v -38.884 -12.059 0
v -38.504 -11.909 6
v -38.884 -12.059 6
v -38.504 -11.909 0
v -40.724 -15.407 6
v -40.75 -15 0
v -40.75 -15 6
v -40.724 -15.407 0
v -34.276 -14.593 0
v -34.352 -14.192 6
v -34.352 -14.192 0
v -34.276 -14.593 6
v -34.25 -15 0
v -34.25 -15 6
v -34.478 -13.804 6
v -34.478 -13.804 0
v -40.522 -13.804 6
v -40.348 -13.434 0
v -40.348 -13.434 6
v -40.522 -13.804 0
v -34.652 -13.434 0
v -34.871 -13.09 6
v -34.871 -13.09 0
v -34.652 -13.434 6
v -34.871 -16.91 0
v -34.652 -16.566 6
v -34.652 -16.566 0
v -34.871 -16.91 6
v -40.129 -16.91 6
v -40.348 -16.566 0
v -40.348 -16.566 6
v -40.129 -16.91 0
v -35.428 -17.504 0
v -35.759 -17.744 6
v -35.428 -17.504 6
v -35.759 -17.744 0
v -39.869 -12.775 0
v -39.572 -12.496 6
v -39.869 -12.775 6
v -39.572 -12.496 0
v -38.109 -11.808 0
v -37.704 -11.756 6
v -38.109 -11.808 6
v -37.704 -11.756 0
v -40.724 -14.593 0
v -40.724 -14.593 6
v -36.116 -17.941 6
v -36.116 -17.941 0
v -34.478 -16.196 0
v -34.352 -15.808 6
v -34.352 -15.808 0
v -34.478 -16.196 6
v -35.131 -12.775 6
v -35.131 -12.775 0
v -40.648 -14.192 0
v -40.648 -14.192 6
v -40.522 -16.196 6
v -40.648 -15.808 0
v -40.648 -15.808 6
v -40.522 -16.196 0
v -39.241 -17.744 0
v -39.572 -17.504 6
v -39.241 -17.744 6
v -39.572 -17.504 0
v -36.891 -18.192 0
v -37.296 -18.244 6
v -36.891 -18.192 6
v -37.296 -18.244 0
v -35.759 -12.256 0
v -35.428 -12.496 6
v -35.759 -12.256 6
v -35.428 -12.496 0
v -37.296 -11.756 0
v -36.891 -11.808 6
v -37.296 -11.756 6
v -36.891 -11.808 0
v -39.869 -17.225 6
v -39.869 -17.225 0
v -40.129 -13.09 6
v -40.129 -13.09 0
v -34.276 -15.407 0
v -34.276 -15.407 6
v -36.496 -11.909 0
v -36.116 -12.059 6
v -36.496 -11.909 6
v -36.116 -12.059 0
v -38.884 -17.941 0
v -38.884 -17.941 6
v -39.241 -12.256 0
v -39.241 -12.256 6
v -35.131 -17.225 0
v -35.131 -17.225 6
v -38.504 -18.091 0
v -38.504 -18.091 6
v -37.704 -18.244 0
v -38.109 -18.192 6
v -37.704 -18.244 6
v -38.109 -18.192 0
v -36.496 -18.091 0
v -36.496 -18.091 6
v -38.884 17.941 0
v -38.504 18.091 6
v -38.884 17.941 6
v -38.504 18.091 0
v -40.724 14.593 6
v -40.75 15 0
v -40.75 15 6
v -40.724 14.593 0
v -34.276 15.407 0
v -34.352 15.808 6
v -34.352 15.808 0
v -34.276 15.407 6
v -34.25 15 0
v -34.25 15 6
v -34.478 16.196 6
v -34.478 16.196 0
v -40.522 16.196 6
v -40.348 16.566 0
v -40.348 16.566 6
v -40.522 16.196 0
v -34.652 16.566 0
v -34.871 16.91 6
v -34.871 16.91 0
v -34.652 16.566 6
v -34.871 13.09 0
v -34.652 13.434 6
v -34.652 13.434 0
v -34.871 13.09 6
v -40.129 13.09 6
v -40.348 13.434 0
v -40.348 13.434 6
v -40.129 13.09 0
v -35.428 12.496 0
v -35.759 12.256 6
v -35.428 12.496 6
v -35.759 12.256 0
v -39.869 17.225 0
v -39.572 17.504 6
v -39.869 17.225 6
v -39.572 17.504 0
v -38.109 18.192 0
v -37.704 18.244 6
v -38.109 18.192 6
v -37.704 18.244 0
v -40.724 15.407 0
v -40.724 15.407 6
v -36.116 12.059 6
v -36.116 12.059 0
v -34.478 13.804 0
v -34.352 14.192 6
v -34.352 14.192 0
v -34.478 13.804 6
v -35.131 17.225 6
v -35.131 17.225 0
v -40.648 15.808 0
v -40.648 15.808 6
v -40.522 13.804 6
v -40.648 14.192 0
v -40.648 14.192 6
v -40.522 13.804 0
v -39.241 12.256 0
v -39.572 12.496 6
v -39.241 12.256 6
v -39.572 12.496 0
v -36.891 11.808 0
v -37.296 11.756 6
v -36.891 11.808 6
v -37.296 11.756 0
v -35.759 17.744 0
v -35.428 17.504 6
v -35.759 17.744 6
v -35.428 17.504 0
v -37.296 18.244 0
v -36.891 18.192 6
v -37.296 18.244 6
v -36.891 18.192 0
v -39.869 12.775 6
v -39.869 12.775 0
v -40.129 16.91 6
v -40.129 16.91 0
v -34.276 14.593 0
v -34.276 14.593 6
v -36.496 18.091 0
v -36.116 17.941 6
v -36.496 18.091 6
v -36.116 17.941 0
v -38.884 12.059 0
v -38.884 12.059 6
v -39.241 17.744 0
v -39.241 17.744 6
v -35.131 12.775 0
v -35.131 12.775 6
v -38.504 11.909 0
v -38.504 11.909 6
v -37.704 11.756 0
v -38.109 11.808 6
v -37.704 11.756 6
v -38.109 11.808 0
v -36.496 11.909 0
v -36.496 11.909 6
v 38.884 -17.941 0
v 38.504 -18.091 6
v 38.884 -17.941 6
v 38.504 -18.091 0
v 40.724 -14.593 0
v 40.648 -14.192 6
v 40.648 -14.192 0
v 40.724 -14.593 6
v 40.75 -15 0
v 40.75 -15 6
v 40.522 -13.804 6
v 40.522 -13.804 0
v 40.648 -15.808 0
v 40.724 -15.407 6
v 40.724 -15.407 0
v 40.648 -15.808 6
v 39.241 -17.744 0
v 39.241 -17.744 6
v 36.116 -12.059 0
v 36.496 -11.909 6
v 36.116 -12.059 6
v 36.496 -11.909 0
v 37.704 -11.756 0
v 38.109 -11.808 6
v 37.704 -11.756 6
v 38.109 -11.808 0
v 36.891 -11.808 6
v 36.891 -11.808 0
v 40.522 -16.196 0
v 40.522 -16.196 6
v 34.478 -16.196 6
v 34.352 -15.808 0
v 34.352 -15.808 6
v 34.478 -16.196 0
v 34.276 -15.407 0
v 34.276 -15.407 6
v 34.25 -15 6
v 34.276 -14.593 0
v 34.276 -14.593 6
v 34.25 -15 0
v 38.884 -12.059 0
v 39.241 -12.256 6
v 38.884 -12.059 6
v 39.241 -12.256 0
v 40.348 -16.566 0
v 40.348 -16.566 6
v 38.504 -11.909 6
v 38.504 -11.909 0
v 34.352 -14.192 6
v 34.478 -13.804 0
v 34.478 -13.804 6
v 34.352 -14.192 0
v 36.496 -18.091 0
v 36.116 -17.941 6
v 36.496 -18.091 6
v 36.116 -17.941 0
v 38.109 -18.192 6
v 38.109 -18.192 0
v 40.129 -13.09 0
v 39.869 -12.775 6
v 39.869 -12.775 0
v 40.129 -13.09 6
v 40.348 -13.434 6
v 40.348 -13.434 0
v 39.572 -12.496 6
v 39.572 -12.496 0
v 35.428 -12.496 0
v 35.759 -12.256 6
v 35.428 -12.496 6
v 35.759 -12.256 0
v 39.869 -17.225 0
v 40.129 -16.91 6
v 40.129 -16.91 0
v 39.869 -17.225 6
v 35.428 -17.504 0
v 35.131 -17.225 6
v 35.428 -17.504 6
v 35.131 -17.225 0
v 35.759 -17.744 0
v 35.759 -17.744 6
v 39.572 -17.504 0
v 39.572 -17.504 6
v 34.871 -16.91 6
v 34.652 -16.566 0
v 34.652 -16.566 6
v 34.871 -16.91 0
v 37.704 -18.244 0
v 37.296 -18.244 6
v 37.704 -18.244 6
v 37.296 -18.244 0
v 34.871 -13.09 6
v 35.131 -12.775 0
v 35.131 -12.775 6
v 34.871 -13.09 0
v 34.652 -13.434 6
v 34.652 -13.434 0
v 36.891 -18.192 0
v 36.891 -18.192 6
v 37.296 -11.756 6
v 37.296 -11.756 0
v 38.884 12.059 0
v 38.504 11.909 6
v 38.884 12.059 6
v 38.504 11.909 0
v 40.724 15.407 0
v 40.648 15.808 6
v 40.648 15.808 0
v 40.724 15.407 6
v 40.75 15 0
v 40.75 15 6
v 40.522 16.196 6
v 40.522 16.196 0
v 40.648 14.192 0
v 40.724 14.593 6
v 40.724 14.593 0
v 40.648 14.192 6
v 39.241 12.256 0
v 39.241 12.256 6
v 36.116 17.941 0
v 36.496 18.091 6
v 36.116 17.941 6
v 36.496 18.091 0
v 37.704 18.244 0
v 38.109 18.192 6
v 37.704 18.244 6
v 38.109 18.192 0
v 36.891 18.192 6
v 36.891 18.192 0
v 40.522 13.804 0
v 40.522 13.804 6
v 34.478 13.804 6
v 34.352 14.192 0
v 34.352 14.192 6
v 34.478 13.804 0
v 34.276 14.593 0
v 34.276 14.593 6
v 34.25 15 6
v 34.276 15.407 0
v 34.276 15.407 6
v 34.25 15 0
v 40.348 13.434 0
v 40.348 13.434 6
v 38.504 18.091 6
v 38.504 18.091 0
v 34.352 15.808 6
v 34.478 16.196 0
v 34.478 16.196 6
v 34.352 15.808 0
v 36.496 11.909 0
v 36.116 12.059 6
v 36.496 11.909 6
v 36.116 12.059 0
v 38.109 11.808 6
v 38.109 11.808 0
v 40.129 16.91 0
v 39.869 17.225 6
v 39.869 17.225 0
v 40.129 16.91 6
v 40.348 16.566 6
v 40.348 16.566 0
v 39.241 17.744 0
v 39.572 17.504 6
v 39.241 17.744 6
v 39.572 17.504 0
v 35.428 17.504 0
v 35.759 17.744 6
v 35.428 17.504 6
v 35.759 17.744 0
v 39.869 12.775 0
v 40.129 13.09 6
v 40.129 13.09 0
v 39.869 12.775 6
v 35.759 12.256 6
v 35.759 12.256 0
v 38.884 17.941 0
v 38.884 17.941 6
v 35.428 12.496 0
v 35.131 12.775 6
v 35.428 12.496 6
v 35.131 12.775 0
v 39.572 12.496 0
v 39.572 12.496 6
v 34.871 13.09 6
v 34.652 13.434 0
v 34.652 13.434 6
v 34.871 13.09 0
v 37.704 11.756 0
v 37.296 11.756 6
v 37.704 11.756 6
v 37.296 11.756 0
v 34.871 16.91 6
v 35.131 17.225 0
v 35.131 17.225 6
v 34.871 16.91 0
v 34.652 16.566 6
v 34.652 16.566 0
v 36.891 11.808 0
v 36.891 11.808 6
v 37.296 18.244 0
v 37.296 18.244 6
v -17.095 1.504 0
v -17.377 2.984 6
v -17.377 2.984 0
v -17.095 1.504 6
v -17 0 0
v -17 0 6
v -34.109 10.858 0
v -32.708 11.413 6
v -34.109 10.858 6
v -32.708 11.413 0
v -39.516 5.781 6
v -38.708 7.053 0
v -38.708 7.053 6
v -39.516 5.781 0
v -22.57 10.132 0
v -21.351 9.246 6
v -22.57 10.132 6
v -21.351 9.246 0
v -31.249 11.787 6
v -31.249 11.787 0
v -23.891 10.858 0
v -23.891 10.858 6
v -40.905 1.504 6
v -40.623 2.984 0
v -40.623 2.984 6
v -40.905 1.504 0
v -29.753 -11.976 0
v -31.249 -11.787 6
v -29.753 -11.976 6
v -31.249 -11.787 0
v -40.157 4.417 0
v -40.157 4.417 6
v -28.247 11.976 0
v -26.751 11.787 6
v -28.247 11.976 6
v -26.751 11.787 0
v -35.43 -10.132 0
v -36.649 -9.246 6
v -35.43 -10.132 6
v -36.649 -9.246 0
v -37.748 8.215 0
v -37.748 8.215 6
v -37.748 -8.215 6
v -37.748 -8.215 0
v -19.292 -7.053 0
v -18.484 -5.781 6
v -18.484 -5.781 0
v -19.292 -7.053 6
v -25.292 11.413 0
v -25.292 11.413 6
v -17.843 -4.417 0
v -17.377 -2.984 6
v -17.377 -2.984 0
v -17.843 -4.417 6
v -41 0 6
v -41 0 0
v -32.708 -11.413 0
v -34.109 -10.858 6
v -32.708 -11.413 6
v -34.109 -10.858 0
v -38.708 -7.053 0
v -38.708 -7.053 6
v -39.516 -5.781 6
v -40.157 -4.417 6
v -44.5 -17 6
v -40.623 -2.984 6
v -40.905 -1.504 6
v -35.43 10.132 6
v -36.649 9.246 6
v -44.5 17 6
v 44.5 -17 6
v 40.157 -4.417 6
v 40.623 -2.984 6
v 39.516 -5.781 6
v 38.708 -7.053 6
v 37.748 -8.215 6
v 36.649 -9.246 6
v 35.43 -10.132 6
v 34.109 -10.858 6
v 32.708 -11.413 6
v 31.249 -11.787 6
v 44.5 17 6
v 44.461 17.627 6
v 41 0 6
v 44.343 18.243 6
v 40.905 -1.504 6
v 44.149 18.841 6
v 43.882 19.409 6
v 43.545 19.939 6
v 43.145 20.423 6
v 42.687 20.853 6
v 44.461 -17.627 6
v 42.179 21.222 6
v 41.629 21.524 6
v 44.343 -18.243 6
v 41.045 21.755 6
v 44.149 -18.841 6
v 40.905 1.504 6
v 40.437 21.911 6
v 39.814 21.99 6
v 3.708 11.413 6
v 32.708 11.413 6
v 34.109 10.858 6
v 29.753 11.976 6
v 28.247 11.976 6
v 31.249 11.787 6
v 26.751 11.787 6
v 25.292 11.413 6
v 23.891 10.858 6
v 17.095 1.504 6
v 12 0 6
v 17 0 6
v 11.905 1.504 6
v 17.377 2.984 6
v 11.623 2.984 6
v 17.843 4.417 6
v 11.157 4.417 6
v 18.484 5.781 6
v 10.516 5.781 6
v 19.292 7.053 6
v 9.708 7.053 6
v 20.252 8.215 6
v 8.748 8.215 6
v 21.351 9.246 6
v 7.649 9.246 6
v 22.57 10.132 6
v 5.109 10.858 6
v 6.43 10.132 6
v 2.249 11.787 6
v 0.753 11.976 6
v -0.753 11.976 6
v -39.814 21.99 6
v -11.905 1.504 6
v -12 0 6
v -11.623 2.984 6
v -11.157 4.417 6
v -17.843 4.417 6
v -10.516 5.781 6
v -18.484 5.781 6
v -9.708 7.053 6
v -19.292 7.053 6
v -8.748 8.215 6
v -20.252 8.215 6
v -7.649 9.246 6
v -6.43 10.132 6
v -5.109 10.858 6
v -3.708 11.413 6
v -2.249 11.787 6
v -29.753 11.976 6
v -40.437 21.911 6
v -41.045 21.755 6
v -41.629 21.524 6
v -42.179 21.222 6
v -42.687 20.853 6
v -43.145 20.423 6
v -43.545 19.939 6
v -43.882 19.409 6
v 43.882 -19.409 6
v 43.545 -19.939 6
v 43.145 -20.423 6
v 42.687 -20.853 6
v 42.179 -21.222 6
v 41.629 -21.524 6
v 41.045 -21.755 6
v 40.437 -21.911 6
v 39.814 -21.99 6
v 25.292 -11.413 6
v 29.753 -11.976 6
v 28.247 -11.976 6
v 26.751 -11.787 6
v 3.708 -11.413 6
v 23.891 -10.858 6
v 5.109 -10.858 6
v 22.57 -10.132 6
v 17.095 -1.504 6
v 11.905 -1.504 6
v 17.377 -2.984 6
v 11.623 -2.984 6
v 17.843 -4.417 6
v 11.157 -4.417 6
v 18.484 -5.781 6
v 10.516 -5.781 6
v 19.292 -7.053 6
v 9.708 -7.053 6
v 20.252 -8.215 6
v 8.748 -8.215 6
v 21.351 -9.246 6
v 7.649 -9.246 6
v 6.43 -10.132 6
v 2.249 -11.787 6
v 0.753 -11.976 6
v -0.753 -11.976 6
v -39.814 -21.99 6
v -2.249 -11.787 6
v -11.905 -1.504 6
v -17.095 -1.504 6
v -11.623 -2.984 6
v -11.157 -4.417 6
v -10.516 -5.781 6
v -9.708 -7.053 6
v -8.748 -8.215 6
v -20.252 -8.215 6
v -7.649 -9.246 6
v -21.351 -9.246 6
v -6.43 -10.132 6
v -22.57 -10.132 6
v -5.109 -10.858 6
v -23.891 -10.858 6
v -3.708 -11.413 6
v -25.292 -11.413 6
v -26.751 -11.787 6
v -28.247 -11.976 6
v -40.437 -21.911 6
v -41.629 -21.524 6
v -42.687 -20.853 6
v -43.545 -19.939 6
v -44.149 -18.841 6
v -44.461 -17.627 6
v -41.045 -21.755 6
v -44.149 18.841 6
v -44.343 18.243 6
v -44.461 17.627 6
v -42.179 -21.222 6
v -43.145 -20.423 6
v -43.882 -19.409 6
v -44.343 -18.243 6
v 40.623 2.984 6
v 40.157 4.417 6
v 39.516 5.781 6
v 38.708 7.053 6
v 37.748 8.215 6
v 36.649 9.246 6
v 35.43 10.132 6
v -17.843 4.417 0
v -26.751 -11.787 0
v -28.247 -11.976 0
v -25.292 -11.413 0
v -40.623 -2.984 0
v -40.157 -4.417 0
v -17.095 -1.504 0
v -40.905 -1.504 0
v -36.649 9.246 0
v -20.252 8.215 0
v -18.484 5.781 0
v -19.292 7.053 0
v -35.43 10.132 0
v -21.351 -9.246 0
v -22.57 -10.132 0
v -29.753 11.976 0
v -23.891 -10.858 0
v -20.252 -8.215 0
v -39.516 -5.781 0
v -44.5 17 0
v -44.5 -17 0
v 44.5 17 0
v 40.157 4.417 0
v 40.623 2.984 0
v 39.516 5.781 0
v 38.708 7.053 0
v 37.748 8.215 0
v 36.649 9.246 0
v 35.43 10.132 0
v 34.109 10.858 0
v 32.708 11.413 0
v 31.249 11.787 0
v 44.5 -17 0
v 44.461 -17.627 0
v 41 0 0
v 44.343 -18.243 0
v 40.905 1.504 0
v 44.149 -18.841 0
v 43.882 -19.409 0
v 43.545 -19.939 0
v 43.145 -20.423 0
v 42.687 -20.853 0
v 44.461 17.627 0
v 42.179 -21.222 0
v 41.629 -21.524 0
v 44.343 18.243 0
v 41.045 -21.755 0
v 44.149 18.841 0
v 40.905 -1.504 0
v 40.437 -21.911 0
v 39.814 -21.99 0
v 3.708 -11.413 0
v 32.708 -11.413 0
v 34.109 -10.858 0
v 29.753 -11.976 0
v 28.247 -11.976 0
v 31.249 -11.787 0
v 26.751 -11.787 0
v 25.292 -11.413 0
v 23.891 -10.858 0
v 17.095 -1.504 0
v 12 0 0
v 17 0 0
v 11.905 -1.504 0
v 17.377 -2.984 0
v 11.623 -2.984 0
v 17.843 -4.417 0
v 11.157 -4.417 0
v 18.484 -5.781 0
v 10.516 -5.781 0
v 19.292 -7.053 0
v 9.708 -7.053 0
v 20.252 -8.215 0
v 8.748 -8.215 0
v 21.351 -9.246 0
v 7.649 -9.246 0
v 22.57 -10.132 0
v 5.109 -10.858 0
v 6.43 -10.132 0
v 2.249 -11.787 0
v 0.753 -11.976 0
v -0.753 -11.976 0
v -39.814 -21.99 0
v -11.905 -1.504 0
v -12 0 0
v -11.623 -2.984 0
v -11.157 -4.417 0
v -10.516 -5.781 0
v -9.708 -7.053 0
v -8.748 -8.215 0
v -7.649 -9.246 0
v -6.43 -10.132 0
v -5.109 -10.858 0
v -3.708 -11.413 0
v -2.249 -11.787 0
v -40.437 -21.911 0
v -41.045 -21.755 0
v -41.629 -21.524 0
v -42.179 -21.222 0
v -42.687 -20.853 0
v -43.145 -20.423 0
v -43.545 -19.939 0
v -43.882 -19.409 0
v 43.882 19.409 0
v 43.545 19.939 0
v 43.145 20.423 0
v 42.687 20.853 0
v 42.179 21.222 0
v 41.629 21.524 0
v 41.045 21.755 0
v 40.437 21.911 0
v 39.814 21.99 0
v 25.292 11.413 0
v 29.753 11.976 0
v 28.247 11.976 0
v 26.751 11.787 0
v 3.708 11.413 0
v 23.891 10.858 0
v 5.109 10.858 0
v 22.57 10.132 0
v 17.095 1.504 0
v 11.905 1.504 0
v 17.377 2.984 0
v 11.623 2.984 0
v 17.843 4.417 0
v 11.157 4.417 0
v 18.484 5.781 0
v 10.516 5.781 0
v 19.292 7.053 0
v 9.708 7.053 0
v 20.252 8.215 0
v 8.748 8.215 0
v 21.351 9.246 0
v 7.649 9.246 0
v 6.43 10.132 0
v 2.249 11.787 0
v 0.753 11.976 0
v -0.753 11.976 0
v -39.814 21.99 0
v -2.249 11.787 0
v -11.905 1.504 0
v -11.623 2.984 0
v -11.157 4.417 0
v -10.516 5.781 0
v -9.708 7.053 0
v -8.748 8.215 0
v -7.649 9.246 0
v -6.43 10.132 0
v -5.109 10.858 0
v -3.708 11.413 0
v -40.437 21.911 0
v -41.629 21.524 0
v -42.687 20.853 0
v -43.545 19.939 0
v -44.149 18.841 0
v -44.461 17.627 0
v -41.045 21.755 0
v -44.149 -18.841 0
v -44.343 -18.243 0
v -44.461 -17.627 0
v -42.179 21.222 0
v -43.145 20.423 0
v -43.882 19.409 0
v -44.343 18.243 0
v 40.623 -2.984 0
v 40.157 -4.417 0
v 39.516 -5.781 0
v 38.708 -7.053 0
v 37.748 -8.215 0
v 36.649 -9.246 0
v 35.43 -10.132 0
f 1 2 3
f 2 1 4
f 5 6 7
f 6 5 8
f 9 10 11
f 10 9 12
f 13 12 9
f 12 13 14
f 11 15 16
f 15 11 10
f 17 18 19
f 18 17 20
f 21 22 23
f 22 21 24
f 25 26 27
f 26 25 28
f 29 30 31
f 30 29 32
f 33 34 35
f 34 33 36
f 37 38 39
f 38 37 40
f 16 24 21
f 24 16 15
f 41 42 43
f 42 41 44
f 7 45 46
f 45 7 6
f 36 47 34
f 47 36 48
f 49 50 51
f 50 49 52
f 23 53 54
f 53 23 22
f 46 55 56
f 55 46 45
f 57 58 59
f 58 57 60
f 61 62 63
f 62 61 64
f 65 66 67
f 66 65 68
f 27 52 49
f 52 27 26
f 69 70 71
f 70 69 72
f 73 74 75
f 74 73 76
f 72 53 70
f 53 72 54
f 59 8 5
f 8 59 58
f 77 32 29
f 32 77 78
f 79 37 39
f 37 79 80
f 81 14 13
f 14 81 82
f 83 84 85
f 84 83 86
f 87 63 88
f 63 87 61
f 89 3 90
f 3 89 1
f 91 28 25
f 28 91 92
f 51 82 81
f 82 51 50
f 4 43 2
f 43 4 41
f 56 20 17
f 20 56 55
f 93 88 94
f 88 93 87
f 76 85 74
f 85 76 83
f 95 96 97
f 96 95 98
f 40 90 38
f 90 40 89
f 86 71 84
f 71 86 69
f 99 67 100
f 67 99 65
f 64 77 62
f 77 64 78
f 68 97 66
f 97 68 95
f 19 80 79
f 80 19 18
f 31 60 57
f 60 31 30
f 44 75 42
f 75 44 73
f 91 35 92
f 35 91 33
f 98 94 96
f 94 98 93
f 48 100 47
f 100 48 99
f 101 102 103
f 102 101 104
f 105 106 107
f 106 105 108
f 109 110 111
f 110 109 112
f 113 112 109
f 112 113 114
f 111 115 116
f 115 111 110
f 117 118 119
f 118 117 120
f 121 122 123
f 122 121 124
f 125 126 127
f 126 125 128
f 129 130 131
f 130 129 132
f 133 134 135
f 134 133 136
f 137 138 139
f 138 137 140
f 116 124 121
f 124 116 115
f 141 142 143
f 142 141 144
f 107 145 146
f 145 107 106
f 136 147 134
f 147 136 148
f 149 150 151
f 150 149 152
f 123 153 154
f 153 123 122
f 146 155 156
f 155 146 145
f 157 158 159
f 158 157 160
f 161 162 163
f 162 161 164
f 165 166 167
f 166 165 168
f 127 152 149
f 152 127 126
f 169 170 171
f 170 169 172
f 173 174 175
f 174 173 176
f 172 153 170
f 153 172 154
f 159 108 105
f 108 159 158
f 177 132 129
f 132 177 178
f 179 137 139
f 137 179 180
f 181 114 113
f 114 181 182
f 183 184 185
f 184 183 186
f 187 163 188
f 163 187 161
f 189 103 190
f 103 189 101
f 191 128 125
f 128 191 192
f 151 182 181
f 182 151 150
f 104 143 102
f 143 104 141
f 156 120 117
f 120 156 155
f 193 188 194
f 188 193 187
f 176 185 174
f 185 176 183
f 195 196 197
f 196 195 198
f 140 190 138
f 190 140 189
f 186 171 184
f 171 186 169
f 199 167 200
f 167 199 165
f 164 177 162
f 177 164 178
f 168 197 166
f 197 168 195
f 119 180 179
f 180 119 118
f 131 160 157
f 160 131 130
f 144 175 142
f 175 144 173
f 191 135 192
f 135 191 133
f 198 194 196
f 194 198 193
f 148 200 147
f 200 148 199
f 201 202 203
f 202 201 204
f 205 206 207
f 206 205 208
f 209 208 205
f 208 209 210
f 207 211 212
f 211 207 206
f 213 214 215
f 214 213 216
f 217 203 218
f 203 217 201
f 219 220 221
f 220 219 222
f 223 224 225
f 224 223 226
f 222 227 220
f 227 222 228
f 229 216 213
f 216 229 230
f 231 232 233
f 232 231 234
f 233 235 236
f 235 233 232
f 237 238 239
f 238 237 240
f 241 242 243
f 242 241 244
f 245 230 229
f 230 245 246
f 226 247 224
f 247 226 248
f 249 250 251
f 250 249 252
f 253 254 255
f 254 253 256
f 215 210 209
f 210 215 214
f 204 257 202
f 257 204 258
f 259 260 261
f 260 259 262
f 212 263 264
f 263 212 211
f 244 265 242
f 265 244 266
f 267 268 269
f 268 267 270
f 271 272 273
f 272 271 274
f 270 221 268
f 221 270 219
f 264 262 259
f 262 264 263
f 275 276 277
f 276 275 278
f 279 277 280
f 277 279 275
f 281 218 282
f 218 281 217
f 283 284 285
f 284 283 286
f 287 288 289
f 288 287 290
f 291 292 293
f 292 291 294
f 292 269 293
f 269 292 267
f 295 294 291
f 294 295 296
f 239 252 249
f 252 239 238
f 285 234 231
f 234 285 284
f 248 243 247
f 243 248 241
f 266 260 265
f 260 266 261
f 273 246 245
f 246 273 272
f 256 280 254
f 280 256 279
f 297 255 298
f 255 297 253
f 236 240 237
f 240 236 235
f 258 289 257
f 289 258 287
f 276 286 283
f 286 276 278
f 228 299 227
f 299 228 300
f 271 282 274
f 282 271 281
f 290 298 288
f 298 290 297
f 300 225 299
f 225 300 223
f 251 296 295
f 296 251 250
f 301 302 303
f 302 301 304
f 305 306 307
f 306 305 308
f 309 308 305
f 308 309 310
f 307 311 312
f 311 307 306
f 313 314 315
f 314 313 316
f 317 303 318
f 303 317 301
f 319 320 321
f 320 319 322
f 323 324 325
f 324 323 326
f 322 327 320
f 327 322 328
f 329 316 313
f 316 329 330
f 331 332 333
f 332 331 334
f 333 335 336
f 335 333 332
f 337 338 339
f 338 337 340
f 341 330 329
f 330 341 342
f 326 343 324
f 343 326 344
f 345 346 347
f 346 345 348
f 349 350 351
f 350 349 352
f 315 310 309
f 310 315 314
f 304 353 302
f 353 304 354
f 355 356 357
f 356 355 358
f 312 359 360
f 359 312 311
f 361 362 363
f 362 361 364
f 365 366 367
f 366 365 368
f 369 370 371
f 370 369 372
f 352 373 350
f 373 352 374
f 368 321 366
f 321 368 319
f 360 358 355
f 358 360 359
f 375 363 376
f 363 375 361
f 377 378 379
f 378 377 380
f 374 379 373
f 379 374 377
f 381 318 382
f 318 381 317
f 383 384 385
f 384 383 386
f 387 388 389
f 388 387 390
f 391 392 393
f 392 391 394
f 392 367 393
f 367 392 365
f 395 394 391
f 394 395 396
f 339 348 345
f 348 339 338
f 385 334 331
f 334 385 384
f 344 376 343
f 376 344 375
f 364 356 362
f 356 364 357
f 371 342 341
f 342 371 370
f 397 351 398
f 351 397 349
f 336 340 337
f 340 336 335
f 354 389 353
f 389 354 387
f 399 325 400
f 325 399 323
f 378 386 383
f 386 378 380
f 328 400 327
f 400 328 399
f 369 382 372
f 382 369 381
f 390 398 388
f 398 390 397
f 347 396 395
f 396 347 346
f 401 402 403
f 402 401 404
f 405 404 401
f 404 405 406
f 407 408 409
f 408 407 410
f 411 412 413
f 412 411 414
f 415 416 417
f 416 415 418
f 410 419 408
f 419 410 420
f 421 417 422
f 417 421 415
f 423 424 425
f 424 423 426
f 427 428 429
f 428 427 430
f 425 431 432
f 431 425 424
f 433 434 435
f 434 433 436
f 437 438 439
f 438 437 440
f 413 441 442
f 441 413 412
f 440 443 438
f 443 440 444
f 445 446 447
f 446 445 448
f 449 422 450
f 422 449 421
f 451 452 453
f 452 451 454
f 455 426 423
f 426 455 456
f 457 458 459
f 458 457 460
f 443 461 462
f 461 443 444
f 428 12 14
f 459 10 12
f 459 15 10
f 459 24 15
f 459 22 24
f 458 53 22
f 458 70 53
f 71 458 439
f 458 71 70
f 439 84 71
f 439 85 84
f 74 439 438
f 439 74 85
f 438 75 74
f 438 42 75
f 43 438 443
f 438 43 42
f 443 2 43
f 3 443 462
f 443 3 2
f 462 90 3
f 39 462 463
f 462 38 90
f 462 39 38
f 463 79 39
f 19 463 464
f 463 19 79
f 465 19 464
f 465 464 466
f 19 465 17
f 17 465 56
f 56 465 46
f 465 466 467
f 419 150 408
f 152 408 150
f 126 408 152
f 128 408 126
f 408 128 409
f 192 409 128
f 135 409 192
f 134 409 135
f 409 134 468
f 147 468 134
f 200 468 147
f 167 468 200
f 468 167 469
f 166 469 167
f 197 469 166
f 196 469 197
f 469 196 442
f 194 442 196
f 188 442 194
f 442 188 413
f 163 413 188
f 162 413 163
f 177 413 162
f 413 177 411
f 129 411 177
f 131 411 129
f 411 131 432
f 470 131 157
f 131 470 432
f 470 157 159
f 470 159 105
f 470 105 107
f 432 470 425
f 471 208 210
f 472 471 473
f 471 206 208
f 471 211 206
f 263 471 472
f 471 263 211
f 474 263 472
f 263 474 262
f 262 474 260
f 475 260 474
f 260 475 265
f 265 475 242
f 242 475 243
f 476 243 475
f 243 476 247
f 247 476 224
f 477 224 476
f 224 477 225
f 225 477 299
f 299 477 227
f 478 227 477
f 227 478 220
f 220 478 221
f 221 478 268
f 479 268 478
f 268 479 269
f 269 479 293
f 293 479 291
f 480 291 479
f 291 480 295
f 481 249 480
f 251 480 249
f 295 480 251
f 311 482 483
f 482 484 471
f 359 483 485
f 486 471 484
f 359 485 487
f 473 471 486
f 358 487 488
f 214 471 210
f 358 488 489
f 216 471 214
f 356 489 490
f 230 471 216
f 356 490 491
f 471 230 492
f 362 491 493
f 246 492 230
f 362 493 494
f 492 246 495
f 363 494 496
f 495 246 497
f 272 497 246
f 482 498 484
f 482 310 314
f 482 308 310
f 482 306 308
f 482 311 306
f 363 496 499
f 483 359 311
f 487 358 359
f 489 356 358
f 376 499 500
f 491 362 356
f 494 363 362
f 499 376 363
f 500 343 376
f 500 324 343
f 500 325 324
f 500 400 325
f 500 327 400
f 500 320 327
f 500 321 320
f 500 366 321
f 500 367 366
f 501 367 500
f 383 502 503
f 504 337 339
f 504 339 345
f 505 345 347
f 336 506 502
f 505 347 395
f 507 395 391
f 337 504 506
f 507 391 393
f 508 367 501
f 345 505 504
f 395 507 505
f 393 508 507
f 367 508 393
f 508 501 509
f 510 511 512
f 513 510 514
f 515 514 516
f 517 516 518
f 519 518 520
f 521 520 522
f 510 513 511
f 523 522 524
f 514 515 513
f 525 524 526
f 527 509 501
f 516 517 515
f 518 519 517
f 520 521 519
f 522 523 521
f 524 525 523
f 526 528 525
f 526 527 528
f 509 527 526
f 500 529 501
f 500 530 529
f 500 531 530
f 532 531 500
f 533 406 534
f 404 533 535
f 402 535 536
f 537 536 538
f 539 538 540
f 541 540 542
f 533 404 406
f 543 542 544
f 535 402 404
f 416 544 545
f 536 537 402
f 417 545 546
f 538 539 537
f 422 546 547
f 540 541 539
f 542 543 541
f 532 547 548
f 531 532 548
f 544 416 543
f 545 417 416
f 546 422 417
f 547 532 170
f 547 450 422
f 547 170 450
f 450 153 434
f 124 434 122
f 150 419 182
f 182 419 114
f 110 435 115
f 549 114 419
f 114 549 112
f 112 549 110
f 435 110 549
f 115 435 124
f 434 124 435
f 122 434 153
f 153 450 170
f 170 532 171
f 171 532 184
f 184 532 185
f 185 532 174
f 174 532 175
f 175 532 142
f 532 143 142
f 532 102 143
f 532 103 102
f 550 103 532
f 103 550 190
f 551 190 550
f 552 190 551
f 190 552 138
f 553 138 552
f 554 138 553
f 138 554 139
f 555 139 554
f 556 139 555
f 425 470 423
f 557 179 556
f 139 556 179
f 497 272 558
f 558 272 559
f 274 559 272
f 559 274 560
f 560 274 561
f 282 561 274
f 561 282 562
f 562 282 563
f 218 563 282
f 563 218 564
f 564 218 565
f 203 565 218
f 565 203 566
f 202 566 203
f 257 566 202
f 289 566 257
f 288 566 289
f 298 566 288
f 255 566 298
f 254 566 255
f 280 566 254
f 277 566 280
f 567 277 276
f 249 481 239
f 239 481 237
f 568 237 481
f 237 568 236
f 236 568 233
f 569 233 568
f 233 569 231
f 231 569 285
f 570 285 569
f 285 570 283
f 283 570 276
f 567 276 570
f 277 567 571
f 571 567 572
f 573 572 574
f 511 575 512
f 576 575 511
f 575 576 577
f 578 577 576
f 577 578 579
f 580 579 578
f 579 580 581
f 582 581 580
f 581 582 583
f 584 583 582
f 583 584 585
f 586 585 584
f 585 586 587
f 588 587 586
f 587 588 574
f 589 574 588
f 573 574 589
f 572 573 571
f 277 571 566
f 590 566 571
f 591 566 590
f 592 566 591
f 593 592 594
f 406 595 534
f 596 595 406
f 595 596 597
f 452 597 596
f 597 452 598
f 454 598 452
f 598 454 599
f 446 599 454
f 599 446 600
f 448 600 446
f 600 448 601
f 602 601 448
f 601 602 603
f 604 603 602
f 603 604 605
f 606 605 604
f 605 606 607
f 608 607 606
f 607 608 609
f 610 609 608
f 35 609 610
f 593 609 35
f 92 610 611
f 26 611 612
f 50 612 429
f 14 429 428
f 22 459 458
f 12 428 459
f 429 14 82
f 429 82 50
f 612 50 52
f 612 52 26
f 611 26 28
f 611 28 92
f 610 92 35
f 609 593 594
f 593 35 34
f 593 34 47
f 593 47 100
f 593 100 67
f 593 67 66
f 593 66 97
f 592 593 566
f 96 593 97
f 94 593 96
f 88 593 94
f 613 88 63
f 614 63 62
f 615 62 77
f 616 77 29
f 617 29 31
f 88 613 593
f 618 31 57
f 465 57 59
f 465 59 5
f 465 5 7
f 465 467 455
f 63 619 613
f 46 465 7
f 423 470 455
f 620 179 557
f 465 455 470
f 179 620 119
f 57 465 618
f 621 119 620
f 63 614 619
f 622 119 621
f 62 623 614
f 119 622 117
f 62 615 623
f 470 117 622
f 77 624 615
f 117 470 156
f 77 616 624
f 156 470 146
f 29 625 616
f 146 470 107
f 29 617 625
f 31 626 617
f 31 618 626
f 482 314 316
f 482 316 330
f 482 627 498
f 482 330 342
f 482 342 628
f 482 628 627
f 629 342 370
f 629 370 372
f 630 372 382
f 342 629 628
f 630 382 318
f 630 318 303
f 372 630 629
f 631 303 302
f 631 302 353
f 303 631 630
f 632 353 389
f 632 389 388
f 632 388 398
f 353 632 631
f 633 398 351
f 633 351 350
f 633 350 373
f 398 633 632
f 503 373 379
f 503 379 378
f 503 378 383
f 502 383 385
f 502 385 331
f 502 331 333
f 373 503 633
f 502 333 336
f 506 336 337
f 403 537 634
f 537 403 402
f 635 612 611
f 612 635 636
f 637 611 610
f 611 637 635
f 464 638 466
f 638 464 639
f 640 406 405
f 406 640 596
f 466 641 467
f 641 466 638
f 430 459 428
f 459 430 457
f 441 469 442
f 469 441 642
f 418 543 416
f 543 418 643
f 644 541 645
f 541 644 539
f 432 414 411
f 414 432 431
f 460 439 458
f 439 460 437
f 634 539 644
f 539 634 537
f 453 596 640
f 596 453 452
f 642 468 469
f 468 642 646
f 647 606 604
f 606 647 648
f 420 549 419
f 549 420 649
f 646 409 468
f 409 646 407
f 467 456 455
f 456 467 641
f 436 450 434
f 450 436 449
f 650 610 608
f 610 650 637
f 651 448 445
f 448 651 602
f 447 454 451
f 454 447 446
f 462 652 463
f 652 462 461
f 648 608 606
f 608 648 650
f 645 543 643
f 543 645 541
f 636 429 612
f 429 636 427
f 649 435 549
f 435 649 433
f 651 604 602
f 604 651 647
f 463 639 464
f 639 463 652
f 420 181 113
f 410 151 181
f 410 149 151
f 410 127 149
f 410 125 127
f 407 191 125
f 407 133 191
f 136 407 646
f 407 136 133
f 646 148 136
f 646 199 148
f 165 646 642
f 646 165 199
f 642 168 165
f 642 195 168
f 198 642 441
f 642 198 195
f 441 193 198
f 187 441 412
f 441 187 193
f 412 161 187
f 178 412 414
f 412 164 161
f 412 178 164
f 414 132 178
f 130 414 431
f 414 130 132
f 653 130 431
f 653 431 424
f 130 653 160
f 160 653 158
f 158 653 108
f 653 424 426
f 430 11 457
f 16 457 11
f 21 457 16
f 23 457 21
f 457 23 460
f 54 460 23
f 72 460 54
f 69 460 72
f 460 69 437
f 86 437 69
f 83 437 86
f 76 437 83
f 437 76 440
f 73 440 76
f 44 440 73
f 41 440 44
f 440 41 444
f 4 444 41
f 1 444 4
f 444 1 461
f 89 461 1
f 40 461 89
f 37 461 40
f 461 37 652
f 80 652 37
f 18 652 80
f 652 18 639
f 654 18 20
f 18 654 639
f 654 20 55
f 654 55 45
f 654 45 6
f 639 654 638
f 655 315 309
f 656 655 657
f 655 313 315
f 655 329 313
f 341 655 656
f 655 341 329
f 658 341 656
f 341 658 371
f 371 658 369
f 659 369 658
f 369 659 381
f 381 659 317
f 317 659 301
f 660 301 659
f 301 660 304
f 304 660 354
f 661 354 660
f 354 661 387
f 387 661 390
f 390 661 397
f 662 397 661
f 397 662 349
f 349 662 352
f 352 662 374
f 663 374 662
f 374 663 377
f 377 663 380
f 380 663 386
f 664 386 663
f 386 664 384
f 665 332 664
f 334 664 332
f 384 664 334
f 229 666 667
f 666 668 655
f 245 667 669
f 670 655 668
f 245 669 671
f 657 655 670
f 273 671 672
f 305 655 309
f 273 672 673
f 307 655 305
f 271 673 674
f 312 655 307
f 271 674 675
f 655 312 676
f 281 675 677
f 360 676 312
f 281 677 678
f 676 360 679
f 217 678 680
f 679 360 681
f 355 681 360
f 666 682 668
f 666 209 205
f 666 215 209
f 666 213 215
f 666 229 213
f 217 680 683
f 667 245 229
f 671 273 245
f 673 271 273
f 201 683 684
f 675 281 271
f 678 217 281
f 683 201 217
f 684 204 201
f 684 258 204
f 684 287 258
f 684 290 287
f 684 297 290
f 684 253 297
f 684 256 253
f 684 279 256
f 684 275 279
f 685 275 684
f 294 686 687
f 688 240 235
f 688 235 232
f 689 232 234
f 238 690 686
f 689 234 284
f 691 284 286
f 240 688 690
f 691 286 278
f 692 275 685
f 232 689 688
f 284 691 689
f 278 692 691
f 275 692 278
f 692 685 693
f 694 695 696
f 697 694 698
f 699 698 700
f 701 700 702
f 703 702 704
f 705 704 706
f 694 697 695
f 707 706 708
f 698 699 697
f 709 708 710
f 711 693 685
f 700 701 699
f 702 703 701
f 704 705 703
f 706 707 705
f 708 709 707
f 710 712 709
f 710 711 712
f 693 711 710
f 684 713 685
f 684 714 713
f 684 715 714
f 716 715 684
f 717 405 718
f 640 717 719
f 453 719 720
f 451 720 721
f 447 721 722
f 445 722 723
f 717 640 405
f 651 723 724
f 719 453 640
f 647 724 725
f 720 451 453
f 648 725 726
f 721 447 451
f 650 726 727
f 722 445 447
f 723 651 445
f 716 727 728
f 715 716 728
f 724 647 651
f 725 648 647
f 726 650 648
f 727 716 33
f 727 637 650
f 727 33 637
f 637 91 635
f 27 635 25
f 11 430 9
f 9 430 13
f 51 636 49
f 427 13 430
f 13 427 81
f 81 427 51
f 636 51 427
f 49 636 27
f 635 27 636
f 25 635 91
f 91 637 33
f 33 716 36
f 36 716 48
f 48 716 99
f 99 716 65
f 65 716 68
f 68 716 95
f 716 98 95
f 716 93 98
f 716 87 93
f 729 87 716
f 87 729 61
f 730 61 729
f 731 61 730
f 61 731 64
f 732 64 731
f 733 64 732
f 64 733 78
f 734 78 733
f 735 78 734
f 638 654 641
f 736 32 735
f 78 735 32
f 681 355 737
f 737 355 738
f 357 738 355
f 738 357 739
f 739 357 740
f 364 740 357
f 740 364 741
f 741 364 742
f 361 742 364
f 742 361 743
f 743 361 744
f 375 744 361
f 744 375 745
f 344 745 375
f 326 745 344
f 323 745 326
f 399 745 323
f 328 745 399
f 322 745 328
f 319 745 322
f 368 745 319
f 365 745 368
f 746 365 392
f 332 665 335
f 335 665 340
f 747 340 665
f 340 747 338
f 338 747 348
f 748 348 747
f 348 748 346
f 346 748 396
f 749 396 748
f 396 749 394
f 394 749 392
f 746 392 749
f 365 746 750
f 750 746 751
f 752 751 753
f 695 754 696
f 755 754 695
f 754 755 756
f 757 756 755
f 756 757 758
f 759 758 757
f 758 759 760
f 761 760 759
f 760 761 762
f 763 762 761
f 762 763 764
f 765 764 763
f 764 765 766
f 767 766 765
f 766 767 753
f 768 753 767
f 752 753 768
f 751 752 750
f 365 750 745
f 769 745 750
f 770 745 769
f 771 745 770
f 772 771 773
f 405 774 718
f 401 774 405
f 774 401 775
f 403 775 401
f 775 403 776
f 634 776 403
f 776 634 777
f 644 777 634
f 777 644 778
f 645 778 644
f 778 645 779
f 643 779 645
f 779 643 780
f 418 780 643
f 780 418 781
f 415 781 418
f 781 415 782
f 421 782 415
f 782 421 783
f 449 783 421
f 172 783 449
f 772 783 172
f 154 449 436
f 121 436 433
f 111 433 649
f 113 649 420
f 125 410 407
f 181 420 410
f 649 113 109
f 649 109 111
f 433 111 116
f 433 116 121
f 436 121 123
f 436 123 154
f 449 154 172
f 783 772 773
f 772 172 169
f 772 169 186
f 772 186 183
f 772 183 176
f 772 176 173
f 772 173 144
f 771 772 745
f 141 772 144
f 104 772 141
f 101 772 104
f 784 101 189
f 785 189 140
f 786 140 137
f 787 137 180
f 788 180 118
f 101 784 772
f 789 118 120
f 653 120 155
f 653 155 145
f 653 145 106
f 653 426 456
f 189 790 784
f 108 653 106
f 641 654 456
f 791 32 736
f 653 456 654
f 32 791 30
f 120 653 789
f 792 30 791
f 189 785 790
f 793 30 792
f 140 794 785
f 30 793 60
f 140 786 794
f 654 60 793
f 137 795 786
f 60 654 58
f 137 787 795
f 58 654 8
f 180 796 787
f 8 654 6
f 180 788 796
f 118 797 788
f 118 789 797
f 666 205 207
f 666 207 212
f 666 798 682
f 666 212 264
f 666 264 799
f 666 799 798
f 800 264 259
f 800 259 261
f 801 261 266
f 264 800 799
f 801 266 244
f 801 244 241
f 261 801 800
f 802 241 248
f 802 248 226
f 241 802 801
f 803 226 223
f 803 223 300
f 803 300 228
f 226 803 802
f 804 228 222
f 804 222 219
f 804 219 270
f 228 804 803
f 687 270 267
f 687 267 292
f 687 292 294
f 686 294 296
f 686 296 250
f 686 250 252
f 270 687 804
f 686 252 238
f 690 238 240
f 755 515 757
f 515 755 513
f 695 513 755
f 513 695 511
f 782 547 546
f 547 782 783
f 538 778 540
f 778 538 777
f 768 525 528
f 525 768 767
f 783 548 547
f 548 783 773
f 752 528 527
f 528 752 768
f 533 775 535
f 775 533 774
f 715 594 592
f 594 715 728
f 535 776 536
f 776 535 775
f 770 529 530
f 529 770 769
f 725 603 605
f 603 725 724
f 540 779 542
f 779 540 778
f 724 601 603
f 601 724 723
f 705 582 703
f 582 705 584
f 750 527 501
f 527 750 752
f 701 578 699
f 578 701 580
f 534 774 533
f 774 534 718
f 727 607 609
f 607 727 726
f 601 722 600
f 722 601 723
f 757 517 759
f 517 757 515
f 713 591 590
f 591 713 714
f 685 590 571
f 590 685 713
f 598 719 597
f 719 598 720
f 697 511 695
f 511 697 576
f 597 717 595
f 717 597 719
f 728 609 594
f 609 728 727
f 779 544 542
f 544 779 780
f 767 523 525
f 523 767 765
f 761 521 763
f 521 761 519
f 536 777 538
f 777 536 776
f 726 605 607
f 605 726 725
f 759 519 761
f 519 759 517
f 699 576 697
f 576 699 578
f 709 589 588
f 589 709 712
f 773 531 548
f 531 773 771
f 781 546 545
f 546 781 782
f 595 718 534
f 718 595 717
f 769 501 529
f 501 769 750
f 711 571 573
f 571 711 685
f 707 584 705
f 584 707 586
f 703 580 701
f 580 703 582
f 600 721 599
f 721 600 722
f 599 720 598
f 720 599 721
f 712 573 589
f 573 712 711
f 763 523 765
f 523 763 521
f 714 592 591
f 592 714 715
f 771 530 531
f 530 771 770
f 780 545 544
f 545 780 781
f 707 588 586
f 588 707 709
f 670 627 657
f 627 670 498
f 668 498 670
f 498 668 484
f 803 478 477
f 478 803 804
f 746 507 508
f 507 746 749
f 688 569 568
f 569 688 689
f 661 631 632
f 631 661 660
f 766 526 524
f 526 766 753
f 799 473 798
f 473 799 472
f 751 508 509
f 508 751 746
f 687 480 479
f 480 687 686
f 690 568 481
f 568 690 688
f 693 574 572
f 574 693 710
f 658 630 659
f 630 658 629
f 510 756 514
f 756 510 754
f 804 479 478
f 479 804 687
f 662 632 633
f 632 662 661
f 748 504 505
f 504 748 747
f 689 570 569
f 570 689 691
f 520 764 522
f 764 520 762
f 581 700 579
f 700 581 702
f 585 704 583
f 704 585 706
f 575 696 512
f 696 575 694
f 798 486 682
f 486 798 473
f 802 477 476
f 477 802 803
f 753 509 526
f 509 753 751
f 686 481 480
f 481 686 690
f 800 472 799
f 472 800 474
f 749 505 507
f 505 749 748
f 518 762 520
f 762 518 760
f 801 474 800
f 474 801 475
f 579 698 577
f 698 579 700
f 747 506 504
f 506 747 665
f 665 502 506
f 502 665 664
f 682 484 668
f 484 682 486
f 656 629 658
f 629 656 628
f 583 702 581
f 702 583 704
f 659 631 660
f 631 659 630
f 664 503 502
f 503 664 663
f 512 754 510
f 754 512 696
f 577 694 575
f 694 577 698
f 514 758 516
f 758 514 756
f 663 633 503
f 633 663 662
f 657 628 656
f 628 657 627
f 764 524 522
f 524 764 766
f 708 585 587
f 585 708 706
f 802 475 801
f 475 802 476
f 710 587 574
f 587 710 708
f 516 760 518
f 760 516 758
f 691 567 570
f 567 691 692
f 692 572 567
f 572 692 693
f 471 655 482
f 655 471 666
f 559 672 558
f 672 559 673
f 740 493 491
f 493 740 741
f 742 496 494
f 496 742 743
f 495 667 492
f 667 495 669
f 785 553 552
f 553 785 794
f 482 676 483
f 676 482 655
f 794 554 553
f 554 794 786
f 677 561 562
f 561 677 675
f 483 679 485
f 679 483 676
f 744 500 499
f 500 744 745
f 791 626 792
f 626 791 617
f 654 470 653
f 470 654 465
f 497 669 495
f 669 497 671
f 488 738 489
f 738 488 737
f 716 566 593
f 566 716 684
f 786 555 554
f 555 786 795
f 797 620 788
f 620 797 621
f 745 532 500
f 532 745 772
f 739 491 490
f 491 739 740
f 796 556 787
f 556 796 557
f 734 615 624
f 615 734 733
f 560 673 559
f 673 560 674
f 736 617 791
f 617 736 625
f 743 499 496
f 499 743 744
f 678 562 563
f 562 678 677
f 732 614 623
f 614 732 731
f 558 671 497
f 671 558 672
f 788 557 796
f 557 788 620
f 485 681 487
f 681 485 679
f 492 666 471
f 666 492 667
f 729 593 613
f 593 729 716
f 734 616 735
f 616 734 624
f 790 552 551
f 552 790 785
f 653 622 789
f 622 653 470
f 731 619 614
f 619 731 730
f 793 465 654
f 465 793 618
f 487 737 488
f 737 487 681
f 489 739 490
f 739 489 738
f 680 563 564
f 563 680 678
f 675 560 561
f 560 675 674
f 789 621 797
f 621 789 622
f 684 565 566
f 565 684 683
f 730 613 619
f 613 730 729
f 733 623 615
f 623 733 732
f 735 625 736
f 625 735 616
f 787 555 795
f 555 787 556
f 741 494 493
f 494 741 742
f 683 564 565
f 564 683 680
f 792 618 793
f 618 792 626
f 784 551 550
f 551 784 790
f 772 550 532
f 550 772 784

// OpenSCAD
$fn = 50;

difference() {
	union() {
		hull() {
			translate(v = [-39.5, 17.0, 0]) {
				cylinder(h = 6, r = 5);
			}
			translate(v = [39.5, 17.0, 0]) {
				cylinder(h = 6, r = 5);
			}
			translate(v = [-39.5, -17.0, 0]) {
				cylinder(h = 6, r = 5);
			}
			translate(v = [39.5, -17.0, 0]) {
				cylinder(h = 6, r = 5);
			}
		}
	}
	union() {
		translate(v = [-37.5, -15.0, -100.0]) {
			cylinder(h = 200, r = 3.25);
		}
		translate(v = [-37.5, 15.0, -100.0]) {
			cylinder(h = 200, r = 3.25);
		}
		translate(v = [37.5, -15.0, -100.0]) {
			cylinder(h = 200, r = 3.25);
		}
		translate(v = [37.5, 15.0, -100.0]) {
			cylinder(h = 200, r = 3.25);
		}
		translate(v = [-37.5, -15.0, -100.0]) {
			cylinder(h = 200, r = 1.8);
		}
		translate(v = [-37.5, 15.0, -100.0]) {
			cylinder(h = 200, r = 1.8);
		}
		translate(v = [37.5, -15.0, -100.0]) {
			cylinder(h = 200, r = 1.8);
		}
		translate(v = [37.5, 15.0, -100.0]) {
			cylinder(h = 200, r = 1.8);
		}
		translate(v = [-29.0, 0, 0.0]) {
			cylinder(h = 6, r = 12.0);
		}
		cylinder(h = 6, r = 12.0);
		translate(v = [29.0, 0, 0.0]) {
			cylinder(h = 6, r = 12.0);
		}
	}
}
